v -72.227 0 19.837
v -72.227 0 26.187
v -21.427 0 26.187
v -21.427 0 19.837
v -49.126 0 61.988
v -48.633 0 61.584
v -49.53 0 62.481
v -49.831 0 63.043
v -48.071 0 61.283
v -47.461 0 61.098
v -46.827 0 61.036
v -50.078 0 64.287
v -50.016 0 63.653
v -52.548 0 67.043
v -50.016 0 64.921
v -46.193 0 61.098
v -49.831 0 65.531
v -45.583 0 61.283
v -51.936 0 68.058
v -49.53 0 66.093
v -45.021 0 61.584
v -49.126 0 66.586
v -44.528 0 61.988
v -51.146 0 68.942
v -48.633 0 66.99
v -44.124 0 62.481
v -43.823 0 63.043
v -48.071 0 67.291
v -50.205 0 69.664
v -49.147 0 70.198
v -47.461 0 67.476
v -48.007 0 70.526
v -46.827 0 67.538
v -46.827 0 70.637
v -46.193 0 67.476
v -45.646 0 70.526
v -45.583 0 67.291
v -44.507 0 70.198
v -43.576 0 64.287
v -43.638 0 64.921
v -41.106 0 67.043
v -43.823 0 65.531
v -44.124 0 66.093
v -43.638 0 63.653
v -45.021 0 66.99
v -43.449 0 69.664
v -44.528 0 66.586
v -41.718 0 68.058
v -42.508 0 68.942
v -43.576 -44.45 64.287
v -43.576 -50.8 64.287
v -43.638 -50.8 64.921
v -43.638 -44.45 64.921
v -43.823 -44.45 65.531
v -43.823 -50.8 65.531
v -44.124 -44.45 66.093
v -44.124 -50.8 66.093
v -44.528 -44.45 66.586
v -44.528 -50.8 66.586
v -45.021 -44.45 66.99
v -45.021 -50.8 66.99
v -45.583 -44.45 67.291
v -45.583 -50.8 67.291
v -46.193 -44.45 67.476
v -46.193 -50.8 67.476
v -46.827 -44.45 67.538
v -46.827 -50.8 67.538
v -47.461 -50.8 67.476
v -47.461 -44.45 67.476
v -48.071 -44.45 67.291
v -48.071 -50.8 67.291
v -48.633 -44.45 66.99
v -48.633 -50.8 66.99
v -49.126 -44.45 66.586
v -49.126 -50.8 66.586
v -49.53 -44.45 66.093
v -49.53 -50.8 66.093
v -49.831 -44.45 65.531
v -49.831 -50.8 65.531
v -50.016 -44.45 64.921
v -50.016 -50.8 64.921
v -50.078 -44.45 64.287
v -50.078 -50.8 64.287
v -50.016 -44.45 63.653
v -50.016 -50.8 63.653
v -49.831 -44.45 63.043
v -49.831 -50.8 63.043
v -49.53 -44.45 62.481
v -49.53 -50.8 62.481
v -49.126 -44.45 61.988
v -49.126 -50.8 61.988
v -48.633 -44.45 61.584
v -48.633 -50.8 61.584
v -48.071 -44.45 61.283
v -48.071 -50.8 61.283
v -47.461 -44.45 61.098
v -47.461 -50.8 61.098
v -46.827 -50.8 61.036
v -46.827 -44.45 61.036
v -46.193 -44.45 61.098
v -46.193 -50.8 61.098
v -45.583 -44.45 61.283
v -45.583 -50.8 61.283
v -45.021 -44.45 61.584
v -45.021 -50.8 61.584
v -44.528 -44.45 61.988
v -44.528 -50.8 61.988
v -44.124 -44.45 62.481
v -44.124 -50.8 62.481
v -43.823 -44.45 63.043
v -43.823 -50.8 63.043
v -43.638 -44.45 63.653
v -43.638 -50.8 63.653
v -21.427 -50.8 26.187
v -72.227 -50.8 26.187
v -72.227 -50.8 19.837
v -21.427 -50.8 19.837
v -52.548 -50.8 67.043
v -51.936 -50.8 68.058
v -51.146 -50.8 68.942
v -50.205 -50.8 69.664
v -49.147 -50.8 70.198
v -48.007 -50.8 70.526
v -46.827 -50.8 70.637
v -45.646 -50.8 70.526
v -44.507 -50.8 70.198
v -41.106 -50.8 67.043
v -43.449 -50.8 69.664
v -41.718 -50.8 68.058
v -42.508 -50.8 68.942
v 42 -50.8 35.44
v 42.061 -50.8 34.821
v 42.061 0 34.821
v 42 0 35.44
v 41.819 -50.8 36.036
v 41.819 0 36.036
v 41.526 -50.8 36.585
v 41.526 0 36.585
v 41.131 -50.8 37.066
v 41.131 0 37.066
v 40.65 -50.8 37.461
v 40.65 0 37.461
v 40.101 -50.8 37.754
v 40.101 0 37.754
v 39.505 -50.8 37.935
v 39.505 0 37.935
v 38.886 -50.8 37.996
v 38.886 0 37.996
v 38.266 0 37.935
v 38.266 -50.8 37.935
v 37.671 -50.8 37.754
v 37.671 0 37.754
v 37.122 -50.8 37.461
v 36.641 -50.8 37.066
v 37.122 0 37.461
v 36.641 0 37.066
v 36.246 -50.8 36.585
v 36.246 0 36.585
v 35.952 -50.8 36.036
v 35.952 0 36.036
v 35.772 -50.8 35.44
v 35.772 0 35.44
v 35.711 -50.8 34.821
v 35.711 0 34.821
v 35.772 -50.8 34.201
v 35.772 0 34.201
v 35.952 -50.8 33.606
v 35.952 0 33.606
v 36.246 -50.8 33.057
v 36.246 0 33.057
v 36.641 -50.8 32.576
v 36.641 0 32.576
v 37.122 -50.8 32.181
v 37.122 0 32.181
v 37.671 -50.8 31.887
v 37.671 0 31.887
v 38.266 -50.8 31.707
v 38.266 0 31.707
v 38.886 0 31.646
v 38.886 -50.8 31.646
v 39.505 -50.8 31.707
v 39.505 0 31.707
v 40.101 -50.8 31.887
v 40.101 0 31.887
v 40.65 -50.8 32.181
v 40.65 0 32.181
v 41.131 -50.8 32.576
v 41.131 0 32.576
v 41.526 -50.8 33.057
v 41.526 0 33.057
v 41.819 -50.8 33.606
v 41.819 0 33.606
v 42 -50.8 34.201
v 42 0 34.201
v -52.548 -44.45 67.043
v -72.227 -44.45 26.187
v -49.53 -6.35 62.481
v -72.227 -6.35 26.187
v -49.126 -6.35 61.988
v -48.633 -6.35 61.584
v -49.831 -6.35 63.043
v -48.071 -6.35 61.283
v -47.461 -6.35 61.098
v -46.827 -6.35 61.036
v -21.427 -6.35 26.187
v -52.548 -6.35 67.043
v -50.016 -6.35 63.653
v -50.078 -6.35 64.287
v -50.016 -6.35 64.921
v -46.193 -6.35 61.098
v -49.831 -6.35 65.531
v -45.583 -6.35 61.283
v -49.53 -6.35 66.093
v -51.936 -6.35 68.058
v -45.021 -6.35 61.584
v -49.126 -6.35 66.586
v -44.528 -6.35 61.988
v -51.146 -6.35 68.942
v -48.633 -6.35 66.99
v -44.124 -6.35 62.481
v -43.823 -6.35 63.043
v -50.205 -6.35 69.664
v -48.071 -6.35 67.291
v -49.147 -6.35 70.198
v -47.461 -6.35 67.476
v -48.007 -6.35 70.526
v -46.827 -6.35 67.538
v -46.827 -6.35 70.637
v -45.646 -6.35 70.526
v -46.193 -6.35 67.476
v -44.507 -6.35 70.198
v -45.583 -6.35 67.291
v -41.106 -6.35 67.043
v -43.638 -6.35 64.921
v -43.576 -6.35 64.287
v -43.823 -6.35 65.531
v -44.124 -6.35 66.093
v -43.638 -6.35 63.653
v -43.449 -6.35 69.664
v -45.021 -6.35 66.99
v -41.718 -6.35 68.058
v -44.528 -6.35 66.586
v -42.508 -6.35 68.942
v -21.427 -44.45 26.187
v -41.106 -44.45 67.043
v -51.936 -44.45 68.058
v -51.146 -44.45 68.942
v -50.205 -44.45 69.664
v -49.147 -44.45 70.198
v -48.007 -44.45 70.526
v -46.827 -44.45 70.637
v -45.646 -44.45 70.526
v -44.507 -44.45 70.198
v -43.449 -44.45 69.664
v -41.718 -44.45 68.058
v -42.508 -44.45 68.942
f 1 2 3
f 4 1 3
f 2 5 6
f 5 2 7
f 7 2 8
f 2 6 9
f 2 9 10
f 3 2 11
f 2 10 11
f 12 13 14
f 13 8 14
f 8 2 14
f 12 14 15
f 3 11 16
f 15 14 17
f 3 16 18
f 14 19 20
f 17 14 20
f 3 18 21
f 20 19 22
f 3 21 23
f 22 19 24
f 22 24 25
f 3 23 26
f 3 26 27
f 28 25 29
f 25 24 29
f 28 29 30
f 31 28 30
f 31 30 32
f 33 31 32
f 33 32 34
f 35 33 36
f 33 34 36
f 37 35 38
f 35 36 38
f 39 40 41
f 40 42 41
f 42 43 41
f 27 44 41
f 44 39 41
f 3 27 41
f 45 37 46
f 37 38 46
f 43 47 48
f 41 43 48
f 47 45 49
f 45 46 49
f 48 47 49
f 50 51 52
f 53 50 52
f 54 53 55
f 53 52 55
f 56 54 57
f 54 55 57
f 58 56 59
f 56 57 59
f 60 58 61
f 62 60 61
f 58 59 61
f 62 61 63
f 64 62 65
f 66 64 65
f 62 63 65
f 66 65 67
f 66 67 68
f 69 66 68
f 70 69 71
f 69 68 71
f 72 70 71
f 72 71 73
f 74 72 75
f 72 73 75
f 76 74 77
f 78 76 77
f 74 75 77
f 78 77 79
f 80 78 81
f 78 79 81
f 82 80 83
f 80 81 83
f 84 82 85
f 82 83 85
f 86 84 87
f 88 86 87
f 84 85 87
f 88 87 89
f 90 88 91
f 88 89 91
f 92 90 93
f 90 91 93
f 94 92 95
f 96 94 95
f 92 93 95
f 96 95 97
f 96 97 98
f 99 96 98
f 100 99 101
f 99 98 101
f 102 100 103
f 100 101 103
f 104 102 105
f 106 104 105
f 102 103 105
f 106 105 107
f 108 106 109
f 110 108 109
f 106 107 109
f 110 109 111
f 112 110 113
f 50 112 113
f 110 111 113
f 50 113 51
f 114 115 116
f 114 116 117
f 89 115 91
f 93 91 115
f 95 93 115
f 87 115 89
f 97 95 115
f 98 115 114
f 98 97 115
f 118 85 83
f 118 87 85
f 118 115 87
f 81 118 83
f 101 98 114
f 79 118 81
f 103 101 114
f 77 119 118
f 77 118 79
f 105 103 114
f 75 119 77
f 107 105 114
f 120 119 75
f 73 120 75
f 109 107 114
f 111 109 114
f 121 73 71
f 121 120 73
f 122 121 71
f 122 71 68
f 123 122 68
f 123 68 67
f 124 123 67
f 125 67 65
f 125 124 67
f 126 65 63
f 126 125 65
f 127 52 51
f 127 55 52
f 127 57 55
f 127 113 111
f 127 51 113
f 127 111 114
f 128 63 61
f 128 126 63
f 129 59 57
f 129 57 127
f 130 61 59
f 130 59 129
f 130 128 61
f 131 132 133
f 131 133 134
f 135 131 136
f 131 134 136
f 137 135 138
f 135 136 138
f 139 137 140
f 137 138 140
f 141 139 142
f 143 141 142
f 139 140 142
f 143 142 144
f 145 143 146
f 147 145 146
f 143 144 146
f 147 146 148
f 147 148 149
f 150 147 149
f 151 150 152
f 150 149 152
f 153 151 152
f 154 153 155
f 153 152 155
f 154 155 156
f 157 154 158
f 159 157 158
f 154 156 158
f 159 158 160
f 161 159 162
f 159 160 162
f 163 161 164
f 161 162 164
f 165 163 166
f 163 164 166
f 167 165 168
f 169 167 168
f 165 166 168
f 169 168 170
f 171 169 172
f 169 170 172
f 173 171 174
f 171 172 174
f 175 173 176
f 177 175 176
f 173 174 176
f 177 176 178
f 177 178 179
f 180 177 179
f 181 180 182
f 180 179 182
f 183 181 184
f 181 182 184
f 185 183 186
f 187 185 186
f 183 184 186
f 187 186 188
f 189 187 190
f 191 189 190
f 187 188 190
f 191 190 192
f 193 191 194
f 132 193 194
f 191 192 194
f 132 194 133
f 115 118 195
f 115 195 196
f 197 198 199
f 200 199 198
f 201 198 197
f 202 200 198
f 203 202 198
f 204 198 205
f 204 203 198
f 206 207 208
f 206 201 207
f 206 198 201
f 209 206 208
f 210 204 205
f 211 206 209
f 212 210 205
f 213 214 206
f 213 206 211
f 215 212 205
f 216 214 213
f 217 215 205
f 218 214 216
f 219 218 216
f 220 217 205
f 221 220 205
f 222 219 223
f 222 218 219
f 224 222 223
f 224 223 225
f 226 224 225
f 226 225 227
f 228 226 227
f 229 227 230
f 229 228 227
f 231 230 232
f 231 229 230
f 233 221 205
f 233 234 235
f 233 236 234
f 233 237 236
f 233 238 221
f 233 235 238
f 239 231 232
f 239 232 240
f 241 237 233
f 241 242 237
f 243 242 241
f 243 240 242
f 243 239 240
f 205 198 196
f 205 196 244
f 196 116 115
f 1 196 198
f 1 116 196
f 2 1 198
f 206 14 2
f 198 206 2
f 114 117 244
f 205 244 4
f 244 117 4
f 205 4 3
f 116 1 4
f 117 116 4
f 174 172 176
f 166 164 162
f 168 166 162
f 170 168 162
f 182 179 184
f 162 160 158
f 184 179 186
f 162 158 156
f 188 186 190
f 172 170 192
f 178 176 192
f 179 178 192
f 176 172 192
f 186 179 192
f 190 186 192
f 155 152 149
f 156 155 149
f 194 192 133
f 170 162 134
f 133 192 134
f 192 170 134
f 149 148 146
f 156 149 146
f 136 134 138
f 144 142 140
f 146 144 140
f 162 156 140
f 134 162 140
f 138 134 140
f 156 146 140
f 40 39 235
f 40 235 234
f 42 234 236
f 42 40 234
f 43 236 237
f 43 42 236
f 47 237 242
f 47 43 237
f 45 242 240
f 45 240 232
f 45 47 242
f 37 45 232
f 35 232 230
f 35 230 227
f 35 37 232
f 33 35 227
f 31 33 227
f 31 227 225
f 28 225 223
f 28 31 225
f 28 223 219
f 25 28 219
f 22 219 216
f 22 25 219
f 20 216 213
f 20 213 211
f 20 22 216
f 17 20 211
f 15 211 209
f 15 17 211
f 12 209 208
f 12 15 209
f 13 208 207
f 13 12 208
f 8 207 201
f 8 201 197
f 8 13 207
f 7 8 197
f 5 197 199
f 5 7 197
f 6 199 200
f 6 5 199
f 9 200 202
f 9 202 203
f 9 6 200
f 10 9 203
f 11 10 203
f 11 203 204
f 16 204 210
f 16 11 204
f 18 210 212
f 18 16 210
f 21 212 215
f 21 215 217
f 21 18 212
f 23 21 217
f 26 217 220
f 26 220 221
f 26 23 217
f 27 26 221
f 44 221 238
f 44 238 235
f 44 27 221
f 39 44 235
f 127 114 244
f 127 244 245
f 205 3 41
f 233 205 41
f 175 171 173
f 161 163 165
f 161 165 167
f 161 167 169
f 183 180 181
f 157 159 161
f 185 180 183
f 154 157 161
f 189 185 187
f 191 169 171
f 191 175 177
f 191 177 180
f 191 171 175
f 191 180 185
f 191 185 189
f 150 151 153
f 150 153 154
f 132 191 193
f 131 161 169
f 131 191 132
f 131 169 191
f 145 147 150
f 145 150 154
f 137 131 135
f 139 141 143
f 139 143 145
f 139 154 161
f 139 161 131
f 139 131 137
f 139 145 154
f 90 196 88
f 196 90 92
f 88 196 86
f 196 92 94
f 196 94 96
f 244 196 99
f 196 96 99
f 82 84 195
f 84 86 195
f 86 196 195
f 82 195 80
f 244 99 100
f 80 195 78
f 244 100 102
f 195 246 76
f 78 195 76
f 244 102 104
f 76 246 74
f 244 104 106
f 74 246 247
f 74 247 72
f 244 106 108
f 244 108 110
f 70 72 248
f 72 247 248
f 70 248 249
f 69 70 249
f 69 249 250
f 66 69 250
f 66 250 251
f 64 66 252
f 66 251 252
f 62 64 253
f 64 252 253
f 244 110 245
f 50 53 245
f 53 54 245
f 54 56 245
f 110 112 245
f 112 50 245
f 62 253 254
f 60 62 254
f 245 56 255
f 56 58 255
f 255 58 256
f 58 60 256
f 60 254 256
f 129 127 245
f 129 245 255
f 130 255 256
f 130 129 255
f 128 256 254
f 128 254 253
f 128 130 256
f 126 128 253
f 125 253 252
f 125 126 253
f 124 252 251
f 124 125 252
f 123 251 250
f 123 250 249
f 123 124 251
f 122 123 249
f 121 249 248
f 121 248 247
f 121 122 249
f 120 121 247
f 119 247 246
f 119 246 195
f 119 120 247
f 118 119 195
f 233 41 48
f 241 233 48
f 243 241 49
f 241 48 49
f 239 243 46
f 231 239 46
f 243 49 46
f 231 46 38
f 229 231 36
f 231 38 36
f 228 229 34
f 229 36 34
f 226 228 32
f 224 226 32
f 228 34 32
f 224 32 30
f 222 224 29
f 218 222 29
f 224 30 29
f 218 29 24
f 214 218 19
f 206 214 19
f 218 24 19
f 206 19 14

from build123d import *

# Parameters (mm, degrees)
F0_R     = 3.175
F1_DEPTH = 50.8
F0_W     = 50.8
F0_H     = 6.35
F2_DEPTH = 50.8
F0_R_2   = 3.2512
F3_DEPTH = 6.35
F4_R     = 3.2512
F5_DEPTH = 6.35


with BuildPart() as f1:
    # F0 (on Front) → F1 (new body)
    with BuildSketch(Plane.XZ):
        with Locations((38.885698, 34.820646)):
            Circle(F0_R)
    extrude(amount=F1_DEPTH)


with BuildPart() as f2:
    # F0 (on Front) → F2 (new body)
    with BuildSketch(Plane.XZ):
        with Locations((-46.82683, 23.011949)):
            Rectangle(F0_W, F0_H)
    extrude(amount=F2_DEPTH)

    # F0 (on Front) → F3 (join)
    with BuildSketch(Plane.XZ):
        with BuildLine():
            Line((-52.547761, 67.04257), (-72.22683, 26.186949))
            Line((-72.22683, 26.186949), (-21.42683, 26.186949))
            Line((-21.42683, 26.186949), (-41.105899, 67.04257))
            ThreePointArc((-41.105899, 67.04257), (-40.636094, 65.700205), (-40.47683, 64.286949))
            ThreePointArc((-40.47683, 64.286949), (-48.240086, 58.096214), (-52.547761, 67.04257))
        make_face()
        with BuildLine():
            ThreePointArc((-41.105899, 67.04257), (-46.82683, 70.636949), (-52.547761, 67.04257))
            ThreePointArc((-52.547761, 67.04257), (-48.240086, 58.096214), (-40.47683, 64.286949))
            ThreePointArc((-40.47683, 64.286949), (-40.636094, 65.700205), (-41.105899, 67.04257))
        make_face()
        with Locations((-46.82683, 64.286949)):
            Circle(F0_R_2, mode=Mode.SUBTRACT)
    extrude(amount=F3_DEPTH)

    # F4 (on face) → F5 (join)
    with BuildSketch(Plane.XZ.offset(50.8)):
        with BuildLine():
            ThreePointArc((-41.105899, 67.04257), (-46.82683, 70.636949), (-52.547761, 67.04257))
            Line((-52.547761, 67.04257), (-72.22683, 26.186949))
            Line((-72.22683, 26.186949), (-21.42683, 26.186949))
            Line((-21.42683, 26.186949), (-41.105899, 67.04257))
        make_face()
        with Locations((-46.82683, 64.286949)):
            Circle(F4_R, mode=Mode.SUBTRACT)
    extrude(amount=-F5_DEPTH)


solid = Compound([f1.part, f2.part])
